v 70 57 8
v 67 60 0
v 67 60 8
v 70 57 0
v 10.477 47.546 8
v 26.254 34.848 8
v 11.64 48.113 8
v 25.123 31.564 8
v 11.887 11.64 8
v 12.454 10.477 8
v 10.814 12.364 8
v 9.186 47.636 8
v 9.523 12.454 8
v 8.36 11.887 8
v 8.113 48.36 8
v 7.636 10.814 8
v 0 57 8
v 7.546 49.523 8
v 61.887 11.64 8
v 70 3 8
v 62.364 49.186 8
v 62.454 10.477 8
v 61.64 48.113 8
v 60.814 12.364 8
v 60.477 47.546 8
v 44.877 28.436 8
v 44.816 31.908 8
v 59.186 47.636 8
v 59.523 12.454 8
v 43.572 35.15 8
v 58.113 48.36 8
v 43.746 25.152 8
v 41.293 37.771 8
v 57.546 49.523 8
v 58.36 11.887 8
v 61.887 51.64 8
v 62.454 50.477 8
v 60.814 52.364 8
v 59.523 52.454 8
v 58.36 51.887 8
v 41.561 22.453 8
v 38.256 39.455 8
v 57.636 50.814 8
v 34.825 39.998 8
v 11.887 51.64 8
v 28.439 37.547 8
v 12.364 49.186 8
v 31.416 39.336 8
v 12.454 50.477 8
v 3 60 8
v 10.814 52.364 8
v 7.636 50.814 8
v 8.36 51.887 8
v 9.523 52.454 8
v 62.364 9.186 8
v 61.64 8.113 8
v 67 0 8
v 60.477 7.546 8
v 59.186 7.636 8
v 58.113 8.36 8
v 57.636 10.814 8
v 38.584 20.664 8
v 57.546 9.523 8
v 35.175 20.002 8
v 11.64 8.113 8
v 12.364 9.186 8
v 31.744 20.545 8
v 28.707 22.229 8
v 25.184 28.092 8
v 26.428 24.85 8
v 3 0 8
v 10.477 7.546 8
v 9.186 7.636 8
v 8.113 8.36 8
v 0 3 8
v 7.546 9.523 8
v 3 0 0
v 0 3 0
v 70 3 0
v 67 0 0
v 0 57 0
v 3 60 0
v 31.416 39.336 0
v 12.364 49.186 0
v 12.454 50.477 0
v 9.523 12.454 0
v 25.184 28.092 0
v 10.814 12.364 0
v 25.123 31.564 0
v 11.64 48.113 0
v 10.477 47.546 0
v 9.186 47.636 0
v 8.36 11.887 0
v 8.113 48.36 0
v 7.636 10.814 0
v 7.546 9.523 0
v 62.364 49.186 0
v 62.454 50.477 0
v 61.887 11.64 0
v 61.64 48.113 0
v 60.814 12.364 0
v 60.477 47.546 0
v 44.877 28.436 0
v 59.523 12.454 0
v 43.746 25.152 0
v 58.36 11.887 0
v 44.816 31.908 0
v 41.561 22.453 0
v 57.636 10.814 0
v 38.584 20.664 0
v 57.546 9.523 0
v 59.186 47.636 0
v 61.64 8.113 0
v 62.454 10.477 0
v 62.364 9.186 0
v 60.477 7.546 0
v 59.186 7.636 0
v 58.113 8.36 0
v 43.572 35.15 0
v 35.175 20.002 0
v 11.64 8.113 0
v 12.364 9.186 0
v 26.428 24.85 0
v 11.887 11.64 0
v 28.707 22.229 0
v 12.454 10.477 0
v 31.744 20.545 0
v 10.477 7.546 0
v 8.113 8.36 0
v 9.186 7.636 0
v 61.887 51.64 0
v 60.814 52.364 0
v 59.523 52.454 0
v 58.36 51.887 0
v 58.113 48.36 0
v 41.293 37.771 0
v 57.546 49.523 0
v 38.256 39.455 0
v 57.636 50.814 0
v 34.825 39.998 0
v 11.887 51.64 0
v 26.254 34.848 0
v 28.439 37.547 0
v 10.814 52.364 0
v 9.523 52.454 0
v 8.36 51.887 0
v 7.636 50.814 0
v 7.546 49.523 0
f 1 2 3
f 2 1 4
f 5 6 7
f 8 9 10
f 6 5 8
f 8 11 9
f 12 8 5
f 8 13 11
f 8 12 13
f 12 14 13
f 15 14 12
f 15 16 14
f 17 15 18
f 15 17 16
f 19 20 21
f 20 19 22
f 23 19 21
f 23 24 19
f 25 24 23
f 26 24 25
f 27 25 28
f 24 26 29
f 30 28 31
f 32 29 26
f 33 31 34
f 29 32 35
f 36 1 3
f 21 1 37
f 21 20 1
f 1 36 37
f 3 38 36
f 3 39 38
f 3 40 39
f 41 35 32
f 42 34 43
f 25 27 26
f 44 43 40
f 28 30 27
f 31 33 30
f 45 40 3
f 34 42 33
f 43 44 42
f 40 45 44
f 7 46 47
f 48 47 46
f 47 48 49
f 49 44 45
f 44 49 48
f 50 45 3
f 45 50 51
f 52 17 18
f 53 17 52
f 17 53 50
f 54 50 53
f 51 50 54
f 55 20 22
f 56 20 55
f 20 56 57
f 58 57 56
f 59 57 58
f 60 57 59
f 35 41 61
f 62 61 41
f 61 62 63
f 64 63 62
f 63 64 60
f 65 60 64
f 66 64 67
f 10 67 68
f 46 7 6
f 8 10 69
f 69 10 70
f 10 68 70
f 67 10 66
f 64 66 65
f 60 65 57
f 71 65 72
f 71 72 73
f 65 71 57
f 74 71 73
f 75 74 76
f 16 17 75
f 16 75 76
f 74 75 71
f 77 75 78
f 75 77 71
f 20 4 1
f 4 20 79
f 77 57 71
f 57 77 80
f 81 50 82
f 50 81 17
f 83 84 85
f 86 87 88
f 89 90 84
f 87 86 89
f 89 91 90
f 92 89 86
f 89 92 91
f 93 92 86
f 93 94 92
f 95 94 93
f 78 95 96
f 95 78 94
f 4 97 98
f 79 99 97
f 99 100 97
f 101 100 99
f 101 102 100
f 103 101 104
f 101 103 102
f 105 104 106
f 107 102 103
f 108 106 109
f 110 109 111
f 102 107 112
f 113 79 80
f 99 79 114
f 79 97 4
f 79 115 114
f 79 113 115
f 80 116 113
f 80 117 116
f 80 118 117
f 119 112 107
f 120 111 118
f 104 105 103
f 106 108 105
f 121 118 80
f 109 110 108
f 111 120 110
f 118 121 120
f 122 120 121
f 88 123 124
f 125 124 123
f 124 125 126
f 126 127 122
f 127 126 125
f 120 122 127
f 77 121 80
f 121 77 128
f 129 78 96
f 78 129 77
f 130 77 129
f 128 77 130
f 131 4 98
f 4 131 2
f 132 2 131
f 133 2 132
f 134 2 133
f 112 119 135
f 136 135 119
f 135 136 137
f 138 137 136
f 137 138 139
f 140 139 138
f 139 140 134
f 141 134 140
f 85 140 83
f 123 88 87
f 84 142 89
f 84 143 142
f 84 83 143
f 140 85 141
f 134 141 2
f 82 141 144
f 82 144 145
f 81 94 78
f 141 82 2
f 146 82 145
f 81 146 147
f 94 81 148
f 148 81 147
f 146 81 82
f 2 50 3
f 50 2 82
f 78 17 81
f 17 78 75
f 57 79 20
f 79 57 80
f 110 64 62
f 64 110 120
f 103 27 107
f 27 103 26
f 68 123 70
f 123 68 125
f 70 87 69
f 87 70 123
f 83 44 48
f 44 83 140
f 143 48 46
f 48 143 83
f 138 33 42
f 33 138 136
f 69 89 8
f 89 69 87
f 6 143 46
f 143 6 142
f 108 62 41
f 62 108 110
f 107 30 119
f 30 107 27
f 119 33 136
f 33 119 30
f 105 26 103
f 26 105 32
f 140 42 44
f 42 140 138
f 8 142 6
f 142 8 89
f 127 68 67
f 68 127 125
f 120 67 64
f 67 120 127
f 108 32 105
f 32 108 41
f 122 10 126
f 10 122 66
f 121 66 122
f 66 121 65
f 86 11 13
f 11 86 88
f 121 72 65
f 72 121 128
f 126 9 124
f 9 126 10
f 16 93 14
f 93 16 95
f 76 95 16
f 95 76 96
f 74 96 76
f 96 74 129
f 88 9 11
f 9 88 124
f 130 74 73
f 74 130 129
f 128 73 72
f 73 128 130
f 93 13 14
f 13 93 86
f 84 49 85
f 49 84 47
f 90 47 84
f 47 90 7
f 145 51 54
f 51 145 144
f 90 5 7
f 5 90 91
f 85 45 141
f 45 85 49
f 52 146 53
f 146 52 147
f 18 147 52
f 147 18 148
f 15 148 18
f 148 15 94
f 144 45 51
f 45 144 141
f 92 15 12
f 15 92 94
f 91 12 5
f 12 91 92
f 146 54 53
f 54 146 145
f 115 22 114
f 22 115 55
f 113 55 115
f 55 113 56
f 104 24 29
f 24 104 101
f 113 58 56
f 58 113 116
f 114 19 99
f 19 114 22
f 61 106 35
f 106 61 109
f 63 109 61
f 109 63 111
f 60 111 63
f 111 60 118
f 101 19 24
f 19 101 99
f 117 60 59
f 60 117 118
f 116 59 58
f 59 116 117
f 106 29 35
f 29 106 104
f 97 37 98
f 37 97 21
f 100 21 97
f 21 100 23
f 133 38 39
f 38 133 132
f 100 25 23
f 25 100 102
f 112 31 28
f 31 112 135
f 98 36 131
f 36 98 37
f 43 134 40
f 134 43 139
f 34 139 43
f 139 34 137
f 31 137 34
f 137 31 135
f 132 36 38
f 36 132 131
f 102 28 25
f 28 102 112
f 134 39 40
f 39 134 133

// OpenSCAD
$fn = 32;

// ----------------------------------------------------------------------
// Spacer plate: rect 70 x 60
// ----------------------------------------------------------------------

// --- parameters (mm) ---
bore_r = 10;              // centre bore radius
bolt_r = 2.5;             // bolt hole radius
plate_t = 8;              // plate thickness, Z (extrusion height)
plate_l = 70;             // plate length, X
plate_w = 60;             // plate width, Y
inset = 10;               // corner hole inset

profile = [[3, 0], [67, 0], [70, 3], [70, 57], [67, 60], [3, 60], [0, 57], [0, 3]];  // primary outline, 8 points, counter clockwise
void_1 = [[44.816, 31.908], [43.572, 35.15], [41.293, 37.771], [38.256, 39.455], [34.825, 39.998], [31.416, 39.336], [28.439, 37.547], [26.254, 34.848], [25.123, 31.564], [25.184, 28.092], [26.428, 24.85], [28.707, 22.229], [31.744, 20.545], [35.175, 20.002], [38.584, 20.664], [41.561, 22.453], [43.746, 25.152], [44.877, 28.436]];  // centre bore, 18 points
void_2 = [[12.454, 10.477], [11.887, 11.64], [10.814, 12.364], [9.523, 12.454], [8.36, 11.887], [7.636, 10.814], [7.546, 9.523], [8.113, 8.36], [9.186, 7.636], [10.477, 7.546], [11.64, 8.113], [12.364, 9.186]];  // corner hole, 12 points
void_3 = [[12.454, 50.477], [11.887, 51.64], [10.814, 52.364], [9.523, 52.454], [8.36, 51.887], [7.636, 50.814], [7.546, 49.523], [8.113, 48.36], [9.186, 47.636], [10.477, 47.546], [11.64, 48.113], [12.364, 49.186]];  // corner hole, 12 points
void_4 = [[62.454, 10.477], [61.887, 11.64], [60.814, 12.364], [59.523, 12.454], [58.36, 11.887], [57.636, 10.814], [57.546, 9.523], [58.113, 8.36], [59.186, 7.636], [60.477, 7.546], [61.64, 8.113], [62.364, 9.186]];  // corner hole, 12 points
void_5 = [[62.454, 50.477], [61.887, 51.64], [60.814, 52.364], [59.523, 52.454], [58.36, 51.887], [57.636, 50.814], [57.546, 49.523], [58.113, 48.36], [59.186, 47.636], [60.477, 47.546], [61.64, 48.113], [62.364, 49.186]];  // corner hole, 12 points

// --- the one profile operation ---
difference() {
  linear_extrude(height = plate_t) polygon(points = profile);
  translate([0, 0, -1])
    linear_extrude(height = plate_t + 2) polygon(points = void_1);
  translate([0, 0, -1])
    linear_extrude(height = plate_t + 2) polygon(points = void_2);
  translate([0, 0, -1])
    linear_extrude(height = plate_t + 2) polygon(points = void_3);
  translate([0, 0, -1])
    linear_extrude(height = plate_t + 2) polygon(points = void_4);
  translate([0, 0, -1])
    linear_extrude(height = plate_t + 2) polygon(points = void_5);
}
